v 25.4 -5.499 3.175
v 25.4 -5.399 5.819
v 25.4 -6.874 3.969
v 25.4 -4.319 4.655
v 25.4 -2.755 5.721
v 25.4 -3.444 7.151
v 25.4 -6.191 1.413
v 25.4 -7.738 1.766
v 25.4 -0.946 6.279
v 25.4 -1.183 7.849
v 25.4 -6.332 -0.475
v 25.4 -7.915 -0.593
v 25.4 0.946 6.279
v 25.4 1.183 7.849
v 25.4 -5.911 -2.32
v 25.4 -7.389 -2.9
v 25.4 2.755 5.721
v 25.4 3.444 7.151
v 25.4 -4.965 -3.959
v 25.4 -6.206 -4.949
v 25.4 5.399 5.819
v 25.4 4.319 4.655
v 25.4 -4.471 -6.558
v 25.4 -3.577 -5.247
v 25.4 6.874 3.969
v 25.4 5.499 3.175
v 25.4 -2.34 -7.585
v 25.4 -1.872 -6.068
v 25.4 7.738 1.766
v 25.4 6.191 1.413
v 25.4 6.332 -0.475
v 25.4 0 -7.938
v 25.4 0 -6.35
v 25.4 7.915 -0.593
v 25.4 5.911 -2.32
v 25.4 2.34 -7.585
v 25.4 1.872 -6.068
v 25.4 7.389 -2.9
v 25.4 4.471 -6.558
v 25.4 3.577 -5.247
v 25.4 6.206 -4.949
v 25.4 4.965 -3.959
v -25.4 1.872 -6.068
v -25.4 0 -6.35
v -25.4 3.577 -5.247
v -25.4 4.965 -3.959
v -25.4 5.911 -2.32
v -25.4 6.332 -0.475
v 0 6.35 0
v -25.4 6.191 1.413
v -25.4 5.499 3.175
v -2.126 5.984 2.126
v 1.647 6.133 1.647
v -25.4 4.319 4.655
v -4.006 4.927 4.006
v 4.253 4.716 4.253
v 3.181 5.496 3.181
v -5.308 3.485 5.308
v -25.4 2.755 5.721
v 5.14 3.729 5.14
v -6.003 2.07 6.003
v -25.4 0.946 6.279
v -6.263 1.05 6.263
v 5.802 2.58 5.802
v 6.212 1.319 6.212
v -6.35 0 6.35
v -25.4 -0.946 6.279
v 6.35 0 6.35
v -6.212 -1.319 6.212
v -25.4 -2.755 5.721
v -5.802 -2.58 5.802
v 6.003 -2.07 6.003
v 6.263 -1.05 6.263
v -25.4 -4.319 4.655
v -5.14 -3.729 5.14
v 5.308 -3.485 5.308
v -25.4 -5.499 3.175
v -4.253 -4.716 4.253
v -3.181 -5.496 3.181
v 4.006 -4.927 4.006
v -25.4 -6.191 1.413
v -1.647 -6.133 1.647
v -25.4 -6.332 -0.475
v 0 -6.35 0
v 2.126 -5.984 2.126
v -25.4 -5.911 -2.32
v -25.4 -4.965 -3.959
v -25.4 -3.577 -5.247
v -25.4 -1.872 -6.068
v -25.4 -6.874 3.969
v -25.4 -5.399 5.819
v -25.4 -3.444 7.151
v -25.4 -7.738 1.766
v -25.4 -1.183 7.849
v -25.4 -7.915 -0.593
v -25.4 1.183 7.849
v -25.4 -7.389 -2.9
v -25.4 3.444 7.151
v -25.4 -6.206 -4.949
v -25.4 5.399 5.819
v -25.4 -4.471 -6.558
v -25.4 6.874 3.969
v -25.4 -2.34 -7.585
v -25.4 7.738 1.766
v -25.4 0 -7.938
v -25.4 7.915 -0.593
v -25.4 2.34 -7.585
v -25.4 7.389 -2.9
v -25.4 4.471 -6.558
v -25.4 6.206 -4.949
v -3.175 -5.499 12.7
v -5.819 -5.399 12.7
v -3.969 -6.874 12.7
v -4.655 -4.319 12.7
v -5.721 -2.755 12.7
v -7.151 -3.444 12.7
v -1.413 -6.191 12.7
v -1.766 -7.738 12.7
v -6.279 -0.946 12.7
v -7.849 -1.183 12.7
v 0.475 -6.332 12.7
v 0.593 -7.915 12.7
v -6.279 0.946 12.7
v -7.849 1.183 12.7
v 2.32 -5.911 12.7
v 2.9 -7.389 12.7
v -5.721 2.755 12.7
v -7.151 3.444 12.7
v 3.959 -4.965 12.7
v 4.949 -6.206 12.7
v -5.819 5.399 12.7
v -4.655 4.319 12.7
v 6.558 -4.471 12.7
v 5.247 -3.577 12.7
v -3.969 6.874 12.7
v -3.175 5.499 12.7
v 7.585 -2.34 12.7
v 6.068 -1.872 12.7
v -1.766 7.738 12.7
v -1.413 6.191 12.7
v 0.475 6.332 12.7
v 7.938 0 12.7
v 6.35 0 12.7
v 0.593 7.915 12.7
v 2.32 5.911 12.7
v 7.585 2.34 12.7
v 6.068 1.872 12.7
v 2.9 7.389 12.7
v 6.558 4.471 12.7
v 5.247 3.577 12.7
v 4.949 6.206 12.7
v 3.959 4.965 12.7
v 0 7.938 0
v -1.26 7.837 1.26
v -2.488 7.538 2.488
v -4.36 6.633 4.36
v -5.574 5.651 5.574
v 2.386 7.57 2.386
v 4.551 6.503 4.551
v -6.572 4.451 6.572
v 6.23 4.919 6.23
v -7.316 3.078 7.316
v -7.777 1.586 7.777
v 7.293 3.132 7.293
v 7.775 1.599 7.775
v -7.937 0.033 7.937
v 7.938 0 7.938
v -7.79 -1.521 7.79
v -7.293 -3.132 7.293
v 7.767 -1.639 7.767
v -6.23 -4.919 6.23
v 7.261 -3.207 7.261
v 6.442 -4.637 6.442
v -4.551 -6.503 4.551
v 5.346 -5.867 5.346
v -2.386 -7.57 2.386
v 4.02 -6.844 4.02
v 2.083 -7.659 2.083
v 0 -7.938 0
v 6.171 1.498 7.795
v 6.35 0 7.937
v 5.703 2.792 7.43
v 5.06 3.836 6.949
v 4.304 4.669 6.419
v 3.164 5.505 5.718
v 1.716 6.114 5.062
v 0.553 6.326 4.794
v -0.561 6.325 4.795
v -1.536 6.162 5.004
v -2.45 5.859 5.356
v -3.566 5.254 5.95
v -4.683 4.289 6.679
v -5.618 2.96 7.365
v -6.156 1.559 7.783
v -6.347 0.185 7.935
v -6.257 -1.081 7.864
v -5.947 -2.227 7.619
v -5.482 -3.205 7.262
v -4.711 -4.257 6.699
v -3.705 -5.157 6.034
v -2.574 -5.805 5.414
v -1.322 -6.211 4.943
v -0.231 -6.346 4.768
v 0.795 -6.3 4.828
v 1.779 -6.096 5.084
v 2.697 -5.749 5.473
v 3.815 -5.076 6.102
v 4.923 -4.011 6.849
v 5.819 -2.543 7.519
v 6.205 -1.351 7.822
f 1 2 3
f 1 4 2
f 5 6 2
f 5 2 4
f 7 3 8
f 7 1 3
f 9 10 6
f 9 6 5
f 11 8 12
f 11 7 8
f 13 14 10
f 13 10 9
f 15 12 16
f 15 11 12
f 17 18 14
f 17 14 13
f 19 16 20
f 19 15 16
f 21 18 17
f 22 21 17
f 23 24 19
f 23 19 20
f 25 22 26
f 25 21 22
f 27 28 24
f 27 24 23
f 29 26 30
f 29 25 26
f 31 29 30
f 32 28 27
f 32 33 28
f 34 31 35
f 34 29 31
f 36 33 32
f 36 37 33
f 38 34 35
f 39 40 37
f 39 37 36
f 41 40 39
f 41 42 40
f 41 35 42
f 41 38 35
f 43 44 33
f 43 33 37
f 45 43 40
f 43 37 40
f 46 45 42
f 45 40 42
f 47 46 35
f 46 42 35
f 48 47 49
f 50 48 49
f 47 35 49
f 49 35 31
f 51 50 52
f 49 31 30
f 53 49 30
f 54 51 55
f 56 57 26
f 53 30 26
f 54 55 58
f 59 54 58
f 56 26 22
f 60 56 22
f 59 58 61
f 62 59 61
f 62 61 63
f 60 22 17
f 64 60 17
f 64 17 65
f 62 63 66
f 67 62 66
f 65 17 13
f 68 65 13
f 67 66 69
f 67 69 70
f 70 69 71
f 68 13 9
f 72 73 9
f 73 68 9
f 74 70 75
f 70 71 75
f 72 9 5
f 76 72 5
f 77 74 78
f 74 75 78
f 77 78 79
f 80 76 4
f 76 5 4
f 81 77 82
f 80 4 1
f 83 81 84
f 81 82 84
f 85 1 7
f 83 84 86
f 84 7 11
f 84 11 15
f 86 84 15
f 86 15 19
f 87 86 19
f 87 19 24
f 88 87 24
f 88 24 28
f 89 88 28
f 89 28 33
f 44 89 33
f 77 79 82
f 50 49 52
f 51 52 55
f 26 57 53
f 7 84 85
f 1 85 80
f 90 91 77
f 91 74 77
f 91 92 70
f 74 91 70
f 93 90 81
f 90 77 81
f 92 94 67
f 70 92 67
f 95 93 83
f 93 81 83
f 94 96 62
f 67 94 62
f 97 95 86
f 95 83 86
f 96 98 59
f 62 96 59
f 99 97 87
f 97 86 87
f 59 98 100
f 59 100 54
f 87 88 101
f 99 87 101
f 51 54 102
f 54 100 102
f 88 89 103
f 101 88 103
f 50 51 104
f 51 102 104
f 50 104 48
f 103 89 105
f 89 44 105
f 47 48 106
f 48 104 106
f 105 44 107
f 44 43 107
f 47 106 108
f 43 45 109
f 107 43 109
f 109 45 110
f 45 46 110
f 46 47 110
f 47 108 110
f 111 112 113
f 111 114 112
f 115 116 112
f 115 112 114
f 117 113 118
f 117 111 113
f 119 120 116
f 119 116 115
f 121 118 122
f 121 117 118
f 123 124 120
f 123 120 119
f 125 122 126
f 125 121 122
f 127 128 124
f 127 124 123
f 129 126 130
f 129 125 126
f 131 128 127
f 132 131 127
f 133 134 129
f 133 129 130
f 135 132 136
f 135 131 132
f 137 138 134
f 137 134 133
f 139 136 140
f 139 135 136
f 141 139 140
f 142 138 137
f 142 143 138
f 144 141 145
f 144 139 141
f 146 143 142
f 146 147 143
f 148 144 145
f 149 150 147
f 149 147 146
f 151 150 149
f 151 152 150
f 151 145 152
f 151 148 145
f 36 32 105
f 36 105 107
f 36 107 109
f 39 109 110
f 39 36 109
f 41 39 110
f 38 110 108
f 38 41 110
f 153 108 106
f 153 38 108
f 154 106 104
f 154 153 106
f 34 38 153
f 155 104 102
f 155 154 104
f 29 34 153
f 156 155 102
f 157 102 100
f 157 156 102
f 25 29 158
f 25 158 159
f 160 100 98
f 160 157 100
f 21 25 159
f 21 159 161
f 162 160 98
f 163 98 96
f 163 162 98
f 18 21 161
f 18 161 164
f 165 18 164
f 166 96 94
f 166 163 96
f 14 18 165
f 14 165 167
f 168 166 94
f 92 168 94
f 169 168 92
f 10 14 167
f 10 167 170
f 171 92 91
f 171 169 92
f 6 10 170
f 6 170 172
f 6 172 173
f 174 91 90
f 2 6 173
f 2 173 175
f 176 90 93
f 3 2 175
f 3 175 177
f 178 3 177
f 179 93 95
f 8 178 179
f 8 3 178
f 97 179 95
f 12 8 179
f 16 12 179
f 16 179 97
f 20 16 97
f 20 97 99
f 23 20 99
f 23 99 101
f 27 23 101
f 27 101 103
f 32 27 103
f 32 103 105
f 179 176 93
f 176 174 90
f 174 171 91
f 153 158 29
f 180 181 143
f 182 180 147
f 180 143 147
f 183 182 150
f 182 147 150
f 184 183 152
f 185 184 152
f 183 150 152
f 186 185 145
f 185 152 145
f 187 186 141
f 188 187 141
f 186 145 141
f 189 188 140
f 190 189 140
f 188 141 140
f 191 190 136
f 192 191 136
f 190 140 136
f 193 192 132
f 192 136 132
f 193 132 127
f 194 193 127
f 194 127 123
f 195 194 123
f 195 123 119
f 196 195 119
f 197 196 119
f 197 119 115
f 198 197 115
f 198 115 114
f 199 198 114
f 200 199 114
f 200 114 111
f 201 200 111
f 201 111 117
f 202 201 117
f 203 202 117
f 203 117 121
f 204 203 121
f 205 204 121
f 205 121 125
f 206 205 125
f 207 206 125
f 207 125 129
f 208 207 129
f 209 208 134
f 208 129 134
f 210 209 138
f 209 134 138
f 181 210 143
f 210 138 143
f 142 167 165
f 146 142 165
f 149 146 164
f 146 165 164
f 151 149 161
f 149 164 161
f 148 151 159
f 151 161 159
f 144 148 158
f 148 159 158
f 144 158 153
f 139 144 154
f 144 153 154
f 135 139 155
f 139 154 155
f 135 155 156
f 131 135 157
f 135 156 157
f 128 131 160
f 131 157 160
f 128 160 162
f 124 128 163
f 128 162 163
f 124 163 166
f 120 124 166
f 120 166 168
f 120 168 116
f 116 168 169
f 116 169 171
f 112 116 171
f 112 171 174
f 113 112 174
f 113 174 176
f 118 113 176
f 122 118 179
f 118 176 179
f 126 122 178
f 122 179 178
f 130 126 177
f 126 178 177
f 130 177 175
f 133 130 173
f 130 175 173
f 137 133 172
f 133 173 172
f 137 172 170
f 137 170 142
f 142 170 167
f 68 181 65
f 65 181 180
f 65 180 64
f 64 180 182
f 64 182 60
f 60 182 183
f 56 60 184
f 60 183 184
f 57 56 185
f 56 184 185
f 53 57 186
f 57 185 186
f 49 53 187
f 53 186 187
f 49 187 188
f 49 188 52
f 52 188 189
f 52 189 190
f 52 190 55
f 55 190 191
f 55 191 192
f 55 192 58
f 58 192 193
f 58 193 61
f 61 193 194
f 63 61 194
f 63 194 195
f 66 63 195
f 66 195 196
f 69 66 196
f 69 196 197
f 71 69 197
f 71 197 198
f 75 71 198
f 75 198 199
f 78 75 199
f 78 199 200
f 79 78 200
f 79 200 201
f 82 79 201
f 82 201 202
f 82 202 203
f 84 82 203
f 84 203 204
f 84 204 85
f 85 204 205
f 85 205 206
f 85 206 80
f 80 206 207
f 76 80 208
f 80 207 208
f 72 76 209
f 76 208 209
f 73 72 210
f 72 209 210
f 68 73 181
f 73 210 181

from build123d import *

# Parameters (mm, degrees)
SKETCH4_R           = 7.9375
BOSS_EXTRUDE2_DEPTH = 12.7
SKETCH7_R           = 6.35
CUT_EXTRUDE2_DEPTH  = 12.7
SKETCH8_R           = 7.9375
BOSS_EXTRUDE4_DEPTH = 25.4
SKETCH10_R          = 6.35
CUT_EXTRUDE4_DEPTH  = 12.7
SKETCH9_R           = 6.35
CUT_EXTRUDE5_DEPTH  = 51.8


with BuildPart() as part:
    # Sketch4 → Boss-Extrude2 (new body)
    with BuildSketch(Plane.XY):
        Circle(SKETCH4_R)
    extrude(amount=BOSS_EXTRUDE2_DEPTH)

    # Sketch7 → Cut-Extrude2 (cut)
    with BuildSketch(Plane.XY.offset(12.7)):
        Circle(SKETCH7_R)
    extrude(amount=-CUT_EXTRUDE2_DEPTH, mode=Mode.SUBTRACT)

    # Sketch8 → Boss-Extrude4 (add, symmetric)
    with BuildSketch(Plane(origin=(0, 0, 0), x_dir=(0, 0, -1), z_dir=(1, 0, 0))):
        Circle(SKETCH8_R)
    extrude(amount=BOSS_EXTRUDE4_DEPTH, both=True)

    # Sketch10 → Cut-Extrude4 (cut)
    with BuildSketch(Plane.XY.offset(12.7)):
        Circle(SKETCH10_R)
    extrude(amount=-CUT_EXTRUDE4_DEPTH, mode=Mode.SUBTRACT)

    # Sketch9 → Cut-Extrude5 (cut, through all)
    with BuildSketch(Plane(origin=(25.4, 0, 0), x_dir=(0, 0, -1), z_dir=(1, 0, 0))):
        Circle(SKETCH9_R)
    extrude(amount=-CUT_EXTRUDE5_DEPTH, mode=Mode.SUBTRACT)


solid = part.part
